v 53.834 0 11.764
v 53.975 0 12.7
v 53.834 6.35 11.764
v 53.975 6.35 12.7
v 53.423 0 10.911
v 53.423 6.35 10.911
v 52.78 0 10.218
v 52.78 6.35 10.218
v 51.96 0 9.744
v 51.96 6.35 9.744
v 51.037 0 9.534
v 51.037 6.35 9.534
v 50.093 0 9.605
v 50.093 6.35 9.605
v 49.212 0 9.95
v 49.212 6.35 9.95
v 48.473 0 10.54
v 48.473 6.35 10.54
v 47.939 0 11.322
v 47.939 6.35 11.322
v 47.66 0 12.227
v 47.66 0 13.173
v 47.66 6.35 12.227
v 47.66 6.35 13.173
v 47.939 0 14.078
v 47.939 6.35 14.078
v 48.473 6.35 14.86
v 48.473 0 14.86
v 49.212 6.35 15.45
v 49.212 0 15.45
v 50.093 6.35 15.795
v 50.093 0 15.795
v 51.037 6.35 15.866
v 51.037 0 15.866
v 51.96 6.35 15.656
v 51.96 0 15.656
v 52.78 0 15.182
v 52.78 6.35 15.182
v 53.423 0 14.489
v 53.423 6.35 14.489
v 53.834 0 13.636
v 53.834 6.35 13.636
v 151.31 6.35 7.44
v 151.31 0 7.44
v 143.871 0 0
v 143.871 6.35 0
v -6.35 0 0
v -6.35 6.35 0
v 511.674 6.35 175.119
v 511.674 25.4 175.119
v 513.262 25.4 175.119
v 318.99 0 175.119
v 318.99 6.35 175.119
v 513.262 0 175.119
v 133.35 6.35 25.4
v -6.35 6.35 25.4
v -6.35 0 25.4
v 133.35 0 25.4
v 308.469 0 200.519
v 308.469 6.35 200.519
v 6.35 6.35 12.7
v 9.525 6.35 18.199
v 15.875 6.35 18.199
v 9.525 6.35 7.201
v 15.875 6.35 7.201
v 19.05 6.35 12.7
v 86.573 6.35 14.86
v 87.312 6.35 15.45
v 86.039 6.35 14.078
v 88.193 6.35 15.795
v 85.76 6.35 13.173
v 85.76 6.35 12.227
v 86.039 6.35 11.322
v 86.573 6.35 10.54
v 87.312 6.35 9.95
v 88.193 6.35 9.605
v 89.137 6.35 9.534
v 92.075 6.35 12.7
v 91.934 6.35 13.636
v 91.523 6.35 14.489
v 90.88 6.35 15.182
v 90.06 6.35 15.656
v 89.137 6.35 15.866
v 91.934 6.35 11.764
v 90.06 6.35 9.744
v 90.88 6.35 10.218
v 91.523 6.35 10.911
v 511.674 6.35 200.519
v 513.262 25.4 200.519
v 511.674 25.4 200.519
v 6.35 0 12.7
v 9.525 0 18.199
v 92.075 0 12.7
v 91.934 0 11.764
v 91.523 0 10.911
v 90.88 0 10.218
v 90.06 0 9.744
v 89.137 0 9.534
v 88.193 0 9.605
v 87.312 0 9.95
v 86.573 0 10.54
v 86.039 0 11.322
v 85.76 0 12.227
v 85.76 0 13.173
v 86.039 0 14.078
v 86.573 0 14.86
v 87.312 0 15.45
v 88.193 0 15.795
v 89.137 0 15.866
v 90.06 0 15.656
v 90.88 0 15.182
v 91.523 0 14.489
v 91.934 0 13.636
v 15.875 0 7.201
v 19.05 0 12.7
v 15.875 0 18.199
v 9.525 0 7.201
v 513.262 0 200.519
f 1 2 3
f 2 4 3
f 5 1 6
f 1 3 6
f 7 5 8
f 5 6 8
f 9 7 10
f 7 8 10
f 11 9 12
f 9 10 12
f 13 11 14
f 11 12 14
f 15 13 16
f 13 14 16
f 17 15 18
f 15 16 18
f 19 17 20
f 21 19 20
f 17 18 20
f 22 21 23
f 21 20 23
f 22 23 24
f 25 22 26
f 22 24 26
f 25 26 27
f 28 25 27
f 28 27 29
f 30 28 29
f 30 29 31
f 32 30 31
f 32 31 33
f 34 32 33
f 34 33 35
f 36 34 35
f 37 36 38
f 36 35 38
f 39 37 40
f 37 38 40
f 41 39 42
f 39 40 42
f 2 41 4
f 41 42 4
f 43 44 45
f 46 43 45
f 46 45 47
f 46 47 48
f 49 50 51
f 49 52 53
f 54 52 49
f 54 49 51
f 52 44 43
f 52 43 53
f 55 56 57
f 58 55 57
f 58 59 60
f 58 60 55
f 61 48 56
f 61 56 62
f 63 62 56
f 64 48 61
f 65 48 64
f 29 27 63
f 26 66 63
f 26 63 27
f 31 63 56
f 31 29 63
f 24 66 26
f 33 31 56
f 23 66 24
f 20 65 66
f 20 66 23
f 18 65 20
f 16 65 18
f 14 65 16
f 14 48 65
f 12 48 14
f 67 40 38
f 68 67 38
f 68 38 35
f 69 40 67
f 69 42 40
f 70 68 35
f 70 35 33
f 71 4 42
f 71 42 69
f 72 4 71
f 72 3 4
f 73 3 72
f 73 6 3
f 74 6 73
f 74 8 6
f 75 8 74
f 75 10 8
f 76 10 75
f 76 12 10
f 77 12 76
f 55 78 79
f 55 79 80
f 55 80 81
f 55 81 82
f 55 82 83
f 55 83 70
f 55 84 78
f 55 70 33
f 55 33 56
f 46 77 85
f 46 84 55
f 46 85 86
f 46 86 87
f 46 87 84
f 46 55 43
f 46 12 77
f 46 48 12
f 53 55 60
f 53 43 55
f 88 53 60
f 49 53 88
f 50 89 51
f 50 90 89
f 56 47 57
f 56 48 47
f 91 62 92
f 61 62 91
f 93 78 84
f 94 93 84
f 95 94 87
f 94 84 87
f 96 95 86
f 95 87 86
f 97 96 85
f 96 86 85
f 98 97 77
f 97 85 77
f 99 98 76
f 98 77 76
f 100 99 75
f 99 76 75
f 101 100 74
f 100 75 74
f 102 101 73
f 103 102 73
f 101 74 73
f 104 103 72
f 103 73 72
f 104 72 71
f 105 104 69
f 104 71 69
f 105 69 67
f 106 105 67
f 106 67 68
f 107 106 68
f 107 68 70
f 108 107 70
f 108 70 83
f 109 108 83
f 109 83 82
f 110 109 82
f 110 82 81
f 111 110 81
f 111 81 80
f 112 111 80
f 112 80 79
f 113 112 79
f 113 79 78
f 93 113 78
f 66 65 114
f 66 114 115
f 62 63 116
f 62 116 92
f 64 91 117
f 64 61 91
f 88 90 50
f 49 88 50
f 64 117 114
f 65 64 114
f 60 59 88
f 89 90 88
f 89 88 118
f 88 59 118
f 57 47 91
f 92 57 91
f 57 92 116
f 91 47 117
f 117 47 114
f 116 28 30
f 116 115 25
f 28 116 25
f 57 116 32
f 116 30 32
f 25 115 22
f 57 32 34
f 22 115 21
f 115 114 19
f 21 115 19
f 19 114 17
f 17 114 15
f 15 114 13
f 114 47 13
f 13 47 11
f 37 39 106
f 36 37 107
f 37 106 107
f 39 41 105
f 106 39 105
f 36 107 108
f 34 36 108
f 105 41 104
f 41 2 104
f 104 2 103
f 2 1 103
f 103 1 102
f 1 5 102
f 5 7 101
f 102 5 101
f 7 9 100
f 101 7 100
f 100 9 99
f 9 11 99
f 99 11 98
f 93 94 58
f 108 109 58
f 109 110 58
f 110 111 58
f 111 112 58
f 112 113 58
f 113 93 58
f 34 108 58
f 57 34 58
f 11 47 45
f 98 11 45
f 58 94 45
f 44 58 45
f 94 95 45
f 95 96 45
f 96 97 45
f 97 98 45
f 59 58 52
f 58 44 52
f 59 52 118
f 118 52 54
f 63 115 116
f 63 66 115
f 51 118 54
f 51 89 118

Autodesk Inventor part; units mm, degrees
ref_plane "YZ Plane" through (0, 0, 0) normal (1, 0, 0) x (0, 1, 0)
ref_plane "XZ Plane" through (0, 0, 0) normal (0, 1, 0) x (-1, 0, 0)
ref_plane "XY Plane" through (0, 0, 0) normal (0, 0, 1) x (1, 0, 0)
sketch "Sketch1" plane through (0, 0, 0) normal (0, 1, 0) x (-1, 0, 0)
  line L0 (0, 0) -> (-133.35, 0)
  line L1 (-133.35, 0) -> (-133.35, 25.4)
  line L2 (-133.35, 25.4) -> (0, 25.4)
  line L3 (0, 25.4) -> (0, 0)
  line L4 (-133.35, 25.4) -> (-143.871, 0)
  line L5 (-133.35, 25.4) -> (-105.8572, 25.4) construction
  line L6 (-133.35, 25.4) -> (-151.3105, 7.4395)
  line L7 (-133.35, 25.4) -> (-107.95, 25.4) construction
  line L8 (-151.3105, 7.4395) -> (-143.871, 0)
  line L9 (-133.35, 25.4) -> (-151.3105, 7.4395)
  line L10 (-151.3105, 7.4395) -> (-318.9899, 175.1188)
  line L11 (-318.9899, 175.1188) -> (-301.0293, 193.0793)
  line L12 (-301.0293, 193.0793) -> (-133.35, 25.4)
  circle A0 centre (-12.7, 12.7) radius 6.35
  line L13 (-318.9899, 175.1188) -> (-511.6743, 175.1188)
  line L14 (-511.6743, 175.1188) -> (-511.6743, 200.5188)
  line L15 (-511.6743, 200.5188) -> (-318.9899, 200.5188)
  line L16 (-318.9899, 200.5188) -> (-318.9899, 175.1188)
  line L17 (-318.9899, 175.1188) -> (-308.4688, 200.5188)
  line L18 (-308.4688, 200.5188) -> (-318.9899, 200.5188)
  line L19 (-308.4688, 200.5188) -> (-301.0293, 193.0793)
  line L20 (-133.35, 0) -> (-143.871, 0)
  dimension "d0" = 133.35
  dimension "d1" = 25.4
  dimension "d2" = 112.5
  dimension "d3" = 25.4
  dimension "d4" = 135
  dimension "d5" = 237.1344
  dimension "d6" = 12.7
  dimension "d7" = 192.6844
  dimension "d8" = 25.4
extrude "Extrusion1" add sketch "Sketch1" along normal blind 6.35
sketch "Sketch2" plane through (511.6743, 0, 200.5188) normal (1, 0, 0) x (0, 0, -1)
  line L0 (0, 6.35) -> (25.4, 6.35)
  line L1 (25.4, 0) -> (0, 0)
  line L2 (0, 0) -> (0, 25.4)
  line L3 (0, 25.4) -> (25.4, 25.4)
  line L4 (25.4, 25.4) -> (25.4, 0)
  point P0 (200.5188, 0)
  dimension "d15" = 25.4
  dimension "d16" = 25.4
extrude "Extrusion2" add sketch "Sketch2" along normal blind 1.5875
sketch "Sketch3" plane through (0, 0, 0) normal (-1, 0, 0) x (0, 0, 1)
  line L0 (0, 0) -> (25.4, 0) projected
  line L1 (25.4, 0) -> (25.4, 6.35) projected
  line L2 (0, 6.35) -> (25.4, 6.35) projected
  line L3 (0, 0) -> (0, 6.35) projected
extrude "Extrusion3" add sketch "Sketch3" along normal blind 44.45
sketch "Sketch5" plane through (0, 6.35, 0) normal (0, 1, 0) x (1, 0, 0)
  circle A0 centre (12.7, -12.7) radius 6.35 projected
  line L0 (511.6743, -175.1188) -> (318.9899, -175.1188) projected
  line L1 (12.7, -12.7) -> (12.7, -6.35)
  line L2 (16.3662, -6.35) -> (20.0323, -12.7)
  line L3 (20.0323, -12.7) -> (16.3662, -19.05)
  line L4 (16.3662, -19.05) -> (9.0338, -19.05)
  line L5 (9.0338, -19.05) -> (5.3677, -12.7)
  line L6 (5.3677, -12.7) -> (9.0338, -6.35)
  line L7 (9.0338, -6.35) -> (16.3662, -6.35)
  point P0 (0, 0)
extrude "Extrusion5" cut sketch "Sketch5" against normal blind 6.35 contours A0 L2 L3 | A0 L7 L2 | L3 L4 A0 | A0 L6 L7 | L4 L5 A0 | A0 L5 L6
sketch "Sketch7" plane through (0, 6.35, 0) normal (0, 1, 0) x (1, 0, 0)
  line L0 (-44.45, -25.4) -> (-44.45, 0) projected
  line L1 (511.6743, -175.1188) -> (318.9899, -175.1188) projected
  line L2 (-44.45, -12.7) -> (12.7, -12.7)
  line L3 (12.7, -12.7) -> (-25.4, -12.7)
  line L4 (12.7, -12.7) -> (50.8, -12.7) construction
  line L5 (-25.4, -12.7) -> (50.8, -12.7)
  circle A0 centre (-25.4, -12.7) radius 3.175
  circle A1 centre (50.8, -12.7) radius 3.175
  point P0 (0, 0)
  dimension "d31" = 38.1
  dimension "d32" = 180
  dimension "d33" = 76.2
  dimension "d34" = 0
  dimension "d35" = 6.35
  dimension "d36" = 6.35
extrude "Extrusion7" cut sketch "Sketch7" against normal blind 25.4
sketch "Sketch8" plane through (0, 6.35, 0) normal (0, 1, 0) x (1, 0, 0)
  circle A0 centre (-25.4, -12.7) radius 3.175 projected
  circle A1 centre (50.8, -12.7) radius 3.175 projected
  line L0 (-44.45, 0) -> (0, 0)
  line L1 (0, 0) -> (0, -25.4)
  line L2 (0, -25.4) -> (-44.45, -25.4)
  line L3 (-44.45, -25.4) -> (-44.45, 0)
  line L4 (0, -12.7) -> (12.7, -12.7)
  line L5 (12.7, -12.7) -> (50.8, -12.7)
  line L6 (50.8, -12.7) -> (88.9, -12.7)
  circle A2 centre (88.9, -12.7) radius 3.175
  dimension "d39" = 44.45
  dimension "d40" = 25.4
  dimension "d41" = 38.1
  dimension "d42" = 180
  dimension "d43" = 6.35
extrude "Extrusion8" cut sketch "Sketch8" against normal blind 25.4 contours L1 L2 L3 L0 | A2
sketch "Sketch9" plane through (0, 6.35, 0) normal (-1, 0, 0) x (0, 0, 1)
  line L0 (25.4, -6.35) -> (0, -6.35) projected
  line L1 (25.4, 0) -> (25.4, -6.35) projected
  line L2 (0, 0) -> (25.4, 0) projected
  line L3 (0, -6.35) -> (0, 0) projected
extrude "Extrusion9" add sketch "Sketch9" along normal blind 6.35
sketch "Sketch10" plane through (0, 6.35, 0) normal (0, 1, 0) x (1, 0, 0)
  line L0 (-6.35, -25.4) -> (-6.35, 0) projected
  line L1 (5.3677, -12.7) -> (9.0338, -6.35) projected
  line L2 (9.0338, -6.35) -> (16.3662, -6.35) projected
  line L3 (16.3662, -6.35) -> (20.0323, -12.7) projected
  line L4 (20.0323, -12.7) -> (16.3662, -19.05) projected
  line L5 (16.3662, -19.05) -> (9.0338, -19.05) projected
  line L6 (9.0338, -19.05) -> (5.3677, -12.7) projected
  line L7 (-6.35, -12.7) -> (12.7, -12.7)
  line L8 (12.7, -12.7) -> (6.35, -12.7)
  line L9 (12.7, -12.7) -> (19.05, -12.7) construction
  line L10 (6.35, -12.7) -> (9.525, -7.2007)
  line L11 (9.525, -7.2007) -> (15.875, -7.2007)
  line L12 (15.875, -7.2007) -> (19.05, -12.7)
  line L13 (19.05, -12.7) -> (15.875, -18.1993)
  line L14 (15.875, -18.1993) -> (9.525, -18.1993)
  line L15 (9.525, -18.1993) -> (6.35, -12.7)
  point P0 (0, 0)
  dimension "d48" = 6.35
  dimension "d49" = 180
extrude "Extrusion10" add sketch "Sketch10" against normal blind 6.35
properties part number "Z-PickupArm-L"
